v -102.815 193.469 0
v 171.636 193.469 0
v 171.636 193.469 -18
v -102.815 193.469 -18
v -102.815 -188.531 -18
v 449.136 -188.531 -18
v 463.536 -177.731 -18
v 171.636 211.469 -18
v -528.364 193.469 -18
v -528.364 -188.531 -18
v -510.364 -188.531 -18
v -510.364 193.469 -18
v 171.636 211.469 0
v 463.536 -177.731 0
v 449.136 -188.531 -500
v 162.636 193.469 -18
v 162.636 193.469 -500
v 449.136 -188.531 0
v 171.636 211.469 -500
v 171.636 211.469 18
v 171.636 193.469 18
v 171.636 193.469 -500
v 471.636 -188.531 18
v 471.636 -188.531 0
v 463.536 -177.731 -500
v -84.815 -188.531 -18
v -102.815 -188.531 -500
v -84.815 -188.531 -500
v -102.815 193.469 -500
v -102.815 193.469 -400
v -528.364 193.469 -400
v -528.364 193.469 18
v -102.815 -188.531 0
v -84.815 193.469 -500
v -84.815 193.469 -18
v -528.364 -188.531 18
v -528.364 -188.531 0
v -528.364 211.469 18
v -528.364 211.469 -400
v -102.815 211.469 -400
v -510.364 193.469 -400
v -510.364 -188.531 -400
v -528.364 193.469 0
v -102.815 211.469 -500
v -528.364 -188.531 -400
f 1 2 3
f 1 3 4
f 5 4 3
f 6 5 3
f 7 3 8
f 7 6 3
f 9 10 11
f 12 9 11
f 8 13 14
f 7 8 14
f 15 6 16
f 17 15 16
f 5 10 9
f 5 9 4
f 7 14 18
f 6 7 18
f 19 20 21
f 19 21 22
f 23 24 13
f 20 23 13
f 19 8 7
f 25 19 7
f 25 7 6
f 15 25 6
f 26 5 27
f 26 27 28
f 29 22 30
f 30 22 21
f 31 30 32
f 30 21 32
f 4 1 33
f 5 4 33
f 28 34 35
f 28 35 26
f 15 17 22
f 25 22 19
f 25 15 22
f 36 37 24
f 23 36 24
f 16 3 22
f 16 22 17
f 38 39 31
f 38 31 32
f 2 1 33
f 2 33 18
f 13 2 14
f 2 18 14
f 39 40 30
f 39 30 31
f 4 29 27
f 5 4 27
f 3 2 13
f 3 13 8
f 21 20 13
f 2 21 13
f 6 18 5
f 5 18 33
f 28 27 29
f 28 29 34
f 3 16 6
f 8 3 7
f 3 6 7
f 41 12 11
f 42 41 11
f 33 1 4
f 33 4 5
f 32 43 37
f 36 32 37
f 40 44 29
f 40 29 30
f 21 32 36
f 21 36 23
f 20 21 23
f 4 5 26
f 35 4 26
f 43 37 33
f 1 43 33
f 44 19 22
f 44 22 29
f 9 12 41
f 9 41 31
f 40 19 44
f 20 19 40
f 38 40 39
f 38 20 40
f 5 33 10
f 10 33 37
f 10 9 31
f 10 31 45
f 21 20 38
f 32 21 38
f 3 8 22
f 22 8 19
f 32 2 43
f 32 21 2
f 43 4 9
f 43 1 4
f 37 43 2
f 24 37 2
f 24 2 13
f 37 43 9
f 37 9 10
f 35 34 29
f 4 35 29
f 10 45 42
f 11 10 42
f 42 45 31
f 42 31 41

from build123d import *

# Parameters (mm, degrees)
F1_DEPTH = 18
F2_W     = 18
F2_H     = 400
F3_DEPTH = 500
F4_DEPTH = 400
F2_W_2   = 407.549614
F5_DEPTH = 18
F6_DEPTH = 18
F7_W     = 700
F7_H     = 18
F8_DEPTH = 18


with BuildPart() as f1:
    # F0 (on Top) → F1 (new body)
    with BuildSketch(Plane.XY):
        Polygon((-528.364236, 211.46901), (-528.364236, -188.53099), (471.635764, -188.53099), (171.635764, 211.46901), align=None)
    extrude(amount=F1_DEPTH)


with BuildPart() as f3:
    # F2 (on face) → F3 (new body)
    with BuildSketch(Plane(origin=(0, 0, 0), x_dir=(1, 0, 0), z_dir=(0, 0, -1))):
        with Locations((-93.814622, -11.46901)):
            Rectangle(F2_W, F2_H)
        Polygon((463.535764, 177.73099), (449.135764, 188.53099), (157.235764, -200.66901), (171.635764, -211.46901), align=None)
    extrude(amount=F3_DEPTH)


with BuildPart() as f4:
    # F2 (on face) → F4 (new body)
    with BuildSketch(Plane(origin=(0, 0, 0), x_dir=(1, 0, 0), z_dir=(0, 0, -1))):
        with Locations((-519.364236, -11.46901)):
            Rectangle(F2_W, F2_H)
    extrude(amount=F4_DEPTH)


with BuildPart() as f5:
    # F2 (on face) → F5 (new body)
    with BuildSketch(Plane(origin=(0, 0, 0), x_dir=(1, 0, 0), z_dir=(0, 0, -1))):
        with Locations((-519.364236, -11.46901)):
            Rectangle(F2_W, F2_H)
        with Locations((-306.589429, -11.46901)):
            Rectangle(F2_W_2, F2_H)
    extrude(amount=F5_DEPTH)


with BuildPart() as f6:
    # F2 (on face) → F6 (new body)
    with BuildSketch(Plane(origin=(0, 0, 0), x_dir=(1, 0, 0), z_dir=(0, 0, -1))):
        with Locations((-93.814622, -11.46901)):
            Rectangle(F2_W, F2_H)
        Polygon((449.135764, 188.53099), (-84.814622, 188.53099), (-84.814622, -211.46901), (171.635764, -211.46901), (157.235764, -200.66901), align=None)
        Polygon((463.535764, 177.73099), (449.135764, 188.53099), (157.235764, -200.66901), (171.635764, -211.46901), align=None)
    extrude(amount=F6_DEPTH)


with BuildPart() as f8:
    # F7 (on face) → F8 (new body)
    with BuildSketch(Plane(origin=(0, 211.46901, 0), x_dir=(-1, 0, 0), z_dir=(0, 1, 0))):
        Polygon((528.364236, -400), (528.364236, 0), (-171.635764, 0), (-171.635764, -500), (102.814622, -500), (102.814622, -400), align=None)
        with Locations((178.364236, 9)):
            Rectangle(F7_W, F7_H)
    extrude(amount=-F8_DEPTH)


with BuildPart() as f1_1:
    add(f1.part)

    # F9: cut F8
    add(f8.part, mode=Mode.SUBTRACT)


with BuildPart() as f3_1:
    add(f3.part)

    # F9: cut F8
    add(f8.part, mode=Mode.SUBTRACT)


with BuildPart() as f4_1:
    add(f4.part)

    # F9: cut F8
    add(f8.part, mode=Mode.SUBTRACT)


with BuildPart() as f5_1:
    add(f5.part)

    # F9: cut F8
    add(f8.part, mode=Mode.SUBTRACT)


with BuildPart() as f6_1:
    add(f6.part)

    # F9: cut F8
    add(f8.part, mode=Mode.SUBTRACT)


with BuildPart() as f3_2:
    add(f3_1.part)

    # F10: cut F5, F6
    add(f5_1.part, mode=Mode.SUBTRACT)
    add(f6_1.part, mode=Mode.SUBTRACT)


with BuildPart() as f4_2:
    add(f4_1.part)

    # F10: cut F5, F6
    add(f5_1.part, mode=Mode.SUBTRACT)
    add(f6_1.part, mode=Mode.SUBTRACT)


solid = Compound([f8.part, f1_1.part, f5_1.part, f6_1.part, f3_2.part, f4_2.part])
